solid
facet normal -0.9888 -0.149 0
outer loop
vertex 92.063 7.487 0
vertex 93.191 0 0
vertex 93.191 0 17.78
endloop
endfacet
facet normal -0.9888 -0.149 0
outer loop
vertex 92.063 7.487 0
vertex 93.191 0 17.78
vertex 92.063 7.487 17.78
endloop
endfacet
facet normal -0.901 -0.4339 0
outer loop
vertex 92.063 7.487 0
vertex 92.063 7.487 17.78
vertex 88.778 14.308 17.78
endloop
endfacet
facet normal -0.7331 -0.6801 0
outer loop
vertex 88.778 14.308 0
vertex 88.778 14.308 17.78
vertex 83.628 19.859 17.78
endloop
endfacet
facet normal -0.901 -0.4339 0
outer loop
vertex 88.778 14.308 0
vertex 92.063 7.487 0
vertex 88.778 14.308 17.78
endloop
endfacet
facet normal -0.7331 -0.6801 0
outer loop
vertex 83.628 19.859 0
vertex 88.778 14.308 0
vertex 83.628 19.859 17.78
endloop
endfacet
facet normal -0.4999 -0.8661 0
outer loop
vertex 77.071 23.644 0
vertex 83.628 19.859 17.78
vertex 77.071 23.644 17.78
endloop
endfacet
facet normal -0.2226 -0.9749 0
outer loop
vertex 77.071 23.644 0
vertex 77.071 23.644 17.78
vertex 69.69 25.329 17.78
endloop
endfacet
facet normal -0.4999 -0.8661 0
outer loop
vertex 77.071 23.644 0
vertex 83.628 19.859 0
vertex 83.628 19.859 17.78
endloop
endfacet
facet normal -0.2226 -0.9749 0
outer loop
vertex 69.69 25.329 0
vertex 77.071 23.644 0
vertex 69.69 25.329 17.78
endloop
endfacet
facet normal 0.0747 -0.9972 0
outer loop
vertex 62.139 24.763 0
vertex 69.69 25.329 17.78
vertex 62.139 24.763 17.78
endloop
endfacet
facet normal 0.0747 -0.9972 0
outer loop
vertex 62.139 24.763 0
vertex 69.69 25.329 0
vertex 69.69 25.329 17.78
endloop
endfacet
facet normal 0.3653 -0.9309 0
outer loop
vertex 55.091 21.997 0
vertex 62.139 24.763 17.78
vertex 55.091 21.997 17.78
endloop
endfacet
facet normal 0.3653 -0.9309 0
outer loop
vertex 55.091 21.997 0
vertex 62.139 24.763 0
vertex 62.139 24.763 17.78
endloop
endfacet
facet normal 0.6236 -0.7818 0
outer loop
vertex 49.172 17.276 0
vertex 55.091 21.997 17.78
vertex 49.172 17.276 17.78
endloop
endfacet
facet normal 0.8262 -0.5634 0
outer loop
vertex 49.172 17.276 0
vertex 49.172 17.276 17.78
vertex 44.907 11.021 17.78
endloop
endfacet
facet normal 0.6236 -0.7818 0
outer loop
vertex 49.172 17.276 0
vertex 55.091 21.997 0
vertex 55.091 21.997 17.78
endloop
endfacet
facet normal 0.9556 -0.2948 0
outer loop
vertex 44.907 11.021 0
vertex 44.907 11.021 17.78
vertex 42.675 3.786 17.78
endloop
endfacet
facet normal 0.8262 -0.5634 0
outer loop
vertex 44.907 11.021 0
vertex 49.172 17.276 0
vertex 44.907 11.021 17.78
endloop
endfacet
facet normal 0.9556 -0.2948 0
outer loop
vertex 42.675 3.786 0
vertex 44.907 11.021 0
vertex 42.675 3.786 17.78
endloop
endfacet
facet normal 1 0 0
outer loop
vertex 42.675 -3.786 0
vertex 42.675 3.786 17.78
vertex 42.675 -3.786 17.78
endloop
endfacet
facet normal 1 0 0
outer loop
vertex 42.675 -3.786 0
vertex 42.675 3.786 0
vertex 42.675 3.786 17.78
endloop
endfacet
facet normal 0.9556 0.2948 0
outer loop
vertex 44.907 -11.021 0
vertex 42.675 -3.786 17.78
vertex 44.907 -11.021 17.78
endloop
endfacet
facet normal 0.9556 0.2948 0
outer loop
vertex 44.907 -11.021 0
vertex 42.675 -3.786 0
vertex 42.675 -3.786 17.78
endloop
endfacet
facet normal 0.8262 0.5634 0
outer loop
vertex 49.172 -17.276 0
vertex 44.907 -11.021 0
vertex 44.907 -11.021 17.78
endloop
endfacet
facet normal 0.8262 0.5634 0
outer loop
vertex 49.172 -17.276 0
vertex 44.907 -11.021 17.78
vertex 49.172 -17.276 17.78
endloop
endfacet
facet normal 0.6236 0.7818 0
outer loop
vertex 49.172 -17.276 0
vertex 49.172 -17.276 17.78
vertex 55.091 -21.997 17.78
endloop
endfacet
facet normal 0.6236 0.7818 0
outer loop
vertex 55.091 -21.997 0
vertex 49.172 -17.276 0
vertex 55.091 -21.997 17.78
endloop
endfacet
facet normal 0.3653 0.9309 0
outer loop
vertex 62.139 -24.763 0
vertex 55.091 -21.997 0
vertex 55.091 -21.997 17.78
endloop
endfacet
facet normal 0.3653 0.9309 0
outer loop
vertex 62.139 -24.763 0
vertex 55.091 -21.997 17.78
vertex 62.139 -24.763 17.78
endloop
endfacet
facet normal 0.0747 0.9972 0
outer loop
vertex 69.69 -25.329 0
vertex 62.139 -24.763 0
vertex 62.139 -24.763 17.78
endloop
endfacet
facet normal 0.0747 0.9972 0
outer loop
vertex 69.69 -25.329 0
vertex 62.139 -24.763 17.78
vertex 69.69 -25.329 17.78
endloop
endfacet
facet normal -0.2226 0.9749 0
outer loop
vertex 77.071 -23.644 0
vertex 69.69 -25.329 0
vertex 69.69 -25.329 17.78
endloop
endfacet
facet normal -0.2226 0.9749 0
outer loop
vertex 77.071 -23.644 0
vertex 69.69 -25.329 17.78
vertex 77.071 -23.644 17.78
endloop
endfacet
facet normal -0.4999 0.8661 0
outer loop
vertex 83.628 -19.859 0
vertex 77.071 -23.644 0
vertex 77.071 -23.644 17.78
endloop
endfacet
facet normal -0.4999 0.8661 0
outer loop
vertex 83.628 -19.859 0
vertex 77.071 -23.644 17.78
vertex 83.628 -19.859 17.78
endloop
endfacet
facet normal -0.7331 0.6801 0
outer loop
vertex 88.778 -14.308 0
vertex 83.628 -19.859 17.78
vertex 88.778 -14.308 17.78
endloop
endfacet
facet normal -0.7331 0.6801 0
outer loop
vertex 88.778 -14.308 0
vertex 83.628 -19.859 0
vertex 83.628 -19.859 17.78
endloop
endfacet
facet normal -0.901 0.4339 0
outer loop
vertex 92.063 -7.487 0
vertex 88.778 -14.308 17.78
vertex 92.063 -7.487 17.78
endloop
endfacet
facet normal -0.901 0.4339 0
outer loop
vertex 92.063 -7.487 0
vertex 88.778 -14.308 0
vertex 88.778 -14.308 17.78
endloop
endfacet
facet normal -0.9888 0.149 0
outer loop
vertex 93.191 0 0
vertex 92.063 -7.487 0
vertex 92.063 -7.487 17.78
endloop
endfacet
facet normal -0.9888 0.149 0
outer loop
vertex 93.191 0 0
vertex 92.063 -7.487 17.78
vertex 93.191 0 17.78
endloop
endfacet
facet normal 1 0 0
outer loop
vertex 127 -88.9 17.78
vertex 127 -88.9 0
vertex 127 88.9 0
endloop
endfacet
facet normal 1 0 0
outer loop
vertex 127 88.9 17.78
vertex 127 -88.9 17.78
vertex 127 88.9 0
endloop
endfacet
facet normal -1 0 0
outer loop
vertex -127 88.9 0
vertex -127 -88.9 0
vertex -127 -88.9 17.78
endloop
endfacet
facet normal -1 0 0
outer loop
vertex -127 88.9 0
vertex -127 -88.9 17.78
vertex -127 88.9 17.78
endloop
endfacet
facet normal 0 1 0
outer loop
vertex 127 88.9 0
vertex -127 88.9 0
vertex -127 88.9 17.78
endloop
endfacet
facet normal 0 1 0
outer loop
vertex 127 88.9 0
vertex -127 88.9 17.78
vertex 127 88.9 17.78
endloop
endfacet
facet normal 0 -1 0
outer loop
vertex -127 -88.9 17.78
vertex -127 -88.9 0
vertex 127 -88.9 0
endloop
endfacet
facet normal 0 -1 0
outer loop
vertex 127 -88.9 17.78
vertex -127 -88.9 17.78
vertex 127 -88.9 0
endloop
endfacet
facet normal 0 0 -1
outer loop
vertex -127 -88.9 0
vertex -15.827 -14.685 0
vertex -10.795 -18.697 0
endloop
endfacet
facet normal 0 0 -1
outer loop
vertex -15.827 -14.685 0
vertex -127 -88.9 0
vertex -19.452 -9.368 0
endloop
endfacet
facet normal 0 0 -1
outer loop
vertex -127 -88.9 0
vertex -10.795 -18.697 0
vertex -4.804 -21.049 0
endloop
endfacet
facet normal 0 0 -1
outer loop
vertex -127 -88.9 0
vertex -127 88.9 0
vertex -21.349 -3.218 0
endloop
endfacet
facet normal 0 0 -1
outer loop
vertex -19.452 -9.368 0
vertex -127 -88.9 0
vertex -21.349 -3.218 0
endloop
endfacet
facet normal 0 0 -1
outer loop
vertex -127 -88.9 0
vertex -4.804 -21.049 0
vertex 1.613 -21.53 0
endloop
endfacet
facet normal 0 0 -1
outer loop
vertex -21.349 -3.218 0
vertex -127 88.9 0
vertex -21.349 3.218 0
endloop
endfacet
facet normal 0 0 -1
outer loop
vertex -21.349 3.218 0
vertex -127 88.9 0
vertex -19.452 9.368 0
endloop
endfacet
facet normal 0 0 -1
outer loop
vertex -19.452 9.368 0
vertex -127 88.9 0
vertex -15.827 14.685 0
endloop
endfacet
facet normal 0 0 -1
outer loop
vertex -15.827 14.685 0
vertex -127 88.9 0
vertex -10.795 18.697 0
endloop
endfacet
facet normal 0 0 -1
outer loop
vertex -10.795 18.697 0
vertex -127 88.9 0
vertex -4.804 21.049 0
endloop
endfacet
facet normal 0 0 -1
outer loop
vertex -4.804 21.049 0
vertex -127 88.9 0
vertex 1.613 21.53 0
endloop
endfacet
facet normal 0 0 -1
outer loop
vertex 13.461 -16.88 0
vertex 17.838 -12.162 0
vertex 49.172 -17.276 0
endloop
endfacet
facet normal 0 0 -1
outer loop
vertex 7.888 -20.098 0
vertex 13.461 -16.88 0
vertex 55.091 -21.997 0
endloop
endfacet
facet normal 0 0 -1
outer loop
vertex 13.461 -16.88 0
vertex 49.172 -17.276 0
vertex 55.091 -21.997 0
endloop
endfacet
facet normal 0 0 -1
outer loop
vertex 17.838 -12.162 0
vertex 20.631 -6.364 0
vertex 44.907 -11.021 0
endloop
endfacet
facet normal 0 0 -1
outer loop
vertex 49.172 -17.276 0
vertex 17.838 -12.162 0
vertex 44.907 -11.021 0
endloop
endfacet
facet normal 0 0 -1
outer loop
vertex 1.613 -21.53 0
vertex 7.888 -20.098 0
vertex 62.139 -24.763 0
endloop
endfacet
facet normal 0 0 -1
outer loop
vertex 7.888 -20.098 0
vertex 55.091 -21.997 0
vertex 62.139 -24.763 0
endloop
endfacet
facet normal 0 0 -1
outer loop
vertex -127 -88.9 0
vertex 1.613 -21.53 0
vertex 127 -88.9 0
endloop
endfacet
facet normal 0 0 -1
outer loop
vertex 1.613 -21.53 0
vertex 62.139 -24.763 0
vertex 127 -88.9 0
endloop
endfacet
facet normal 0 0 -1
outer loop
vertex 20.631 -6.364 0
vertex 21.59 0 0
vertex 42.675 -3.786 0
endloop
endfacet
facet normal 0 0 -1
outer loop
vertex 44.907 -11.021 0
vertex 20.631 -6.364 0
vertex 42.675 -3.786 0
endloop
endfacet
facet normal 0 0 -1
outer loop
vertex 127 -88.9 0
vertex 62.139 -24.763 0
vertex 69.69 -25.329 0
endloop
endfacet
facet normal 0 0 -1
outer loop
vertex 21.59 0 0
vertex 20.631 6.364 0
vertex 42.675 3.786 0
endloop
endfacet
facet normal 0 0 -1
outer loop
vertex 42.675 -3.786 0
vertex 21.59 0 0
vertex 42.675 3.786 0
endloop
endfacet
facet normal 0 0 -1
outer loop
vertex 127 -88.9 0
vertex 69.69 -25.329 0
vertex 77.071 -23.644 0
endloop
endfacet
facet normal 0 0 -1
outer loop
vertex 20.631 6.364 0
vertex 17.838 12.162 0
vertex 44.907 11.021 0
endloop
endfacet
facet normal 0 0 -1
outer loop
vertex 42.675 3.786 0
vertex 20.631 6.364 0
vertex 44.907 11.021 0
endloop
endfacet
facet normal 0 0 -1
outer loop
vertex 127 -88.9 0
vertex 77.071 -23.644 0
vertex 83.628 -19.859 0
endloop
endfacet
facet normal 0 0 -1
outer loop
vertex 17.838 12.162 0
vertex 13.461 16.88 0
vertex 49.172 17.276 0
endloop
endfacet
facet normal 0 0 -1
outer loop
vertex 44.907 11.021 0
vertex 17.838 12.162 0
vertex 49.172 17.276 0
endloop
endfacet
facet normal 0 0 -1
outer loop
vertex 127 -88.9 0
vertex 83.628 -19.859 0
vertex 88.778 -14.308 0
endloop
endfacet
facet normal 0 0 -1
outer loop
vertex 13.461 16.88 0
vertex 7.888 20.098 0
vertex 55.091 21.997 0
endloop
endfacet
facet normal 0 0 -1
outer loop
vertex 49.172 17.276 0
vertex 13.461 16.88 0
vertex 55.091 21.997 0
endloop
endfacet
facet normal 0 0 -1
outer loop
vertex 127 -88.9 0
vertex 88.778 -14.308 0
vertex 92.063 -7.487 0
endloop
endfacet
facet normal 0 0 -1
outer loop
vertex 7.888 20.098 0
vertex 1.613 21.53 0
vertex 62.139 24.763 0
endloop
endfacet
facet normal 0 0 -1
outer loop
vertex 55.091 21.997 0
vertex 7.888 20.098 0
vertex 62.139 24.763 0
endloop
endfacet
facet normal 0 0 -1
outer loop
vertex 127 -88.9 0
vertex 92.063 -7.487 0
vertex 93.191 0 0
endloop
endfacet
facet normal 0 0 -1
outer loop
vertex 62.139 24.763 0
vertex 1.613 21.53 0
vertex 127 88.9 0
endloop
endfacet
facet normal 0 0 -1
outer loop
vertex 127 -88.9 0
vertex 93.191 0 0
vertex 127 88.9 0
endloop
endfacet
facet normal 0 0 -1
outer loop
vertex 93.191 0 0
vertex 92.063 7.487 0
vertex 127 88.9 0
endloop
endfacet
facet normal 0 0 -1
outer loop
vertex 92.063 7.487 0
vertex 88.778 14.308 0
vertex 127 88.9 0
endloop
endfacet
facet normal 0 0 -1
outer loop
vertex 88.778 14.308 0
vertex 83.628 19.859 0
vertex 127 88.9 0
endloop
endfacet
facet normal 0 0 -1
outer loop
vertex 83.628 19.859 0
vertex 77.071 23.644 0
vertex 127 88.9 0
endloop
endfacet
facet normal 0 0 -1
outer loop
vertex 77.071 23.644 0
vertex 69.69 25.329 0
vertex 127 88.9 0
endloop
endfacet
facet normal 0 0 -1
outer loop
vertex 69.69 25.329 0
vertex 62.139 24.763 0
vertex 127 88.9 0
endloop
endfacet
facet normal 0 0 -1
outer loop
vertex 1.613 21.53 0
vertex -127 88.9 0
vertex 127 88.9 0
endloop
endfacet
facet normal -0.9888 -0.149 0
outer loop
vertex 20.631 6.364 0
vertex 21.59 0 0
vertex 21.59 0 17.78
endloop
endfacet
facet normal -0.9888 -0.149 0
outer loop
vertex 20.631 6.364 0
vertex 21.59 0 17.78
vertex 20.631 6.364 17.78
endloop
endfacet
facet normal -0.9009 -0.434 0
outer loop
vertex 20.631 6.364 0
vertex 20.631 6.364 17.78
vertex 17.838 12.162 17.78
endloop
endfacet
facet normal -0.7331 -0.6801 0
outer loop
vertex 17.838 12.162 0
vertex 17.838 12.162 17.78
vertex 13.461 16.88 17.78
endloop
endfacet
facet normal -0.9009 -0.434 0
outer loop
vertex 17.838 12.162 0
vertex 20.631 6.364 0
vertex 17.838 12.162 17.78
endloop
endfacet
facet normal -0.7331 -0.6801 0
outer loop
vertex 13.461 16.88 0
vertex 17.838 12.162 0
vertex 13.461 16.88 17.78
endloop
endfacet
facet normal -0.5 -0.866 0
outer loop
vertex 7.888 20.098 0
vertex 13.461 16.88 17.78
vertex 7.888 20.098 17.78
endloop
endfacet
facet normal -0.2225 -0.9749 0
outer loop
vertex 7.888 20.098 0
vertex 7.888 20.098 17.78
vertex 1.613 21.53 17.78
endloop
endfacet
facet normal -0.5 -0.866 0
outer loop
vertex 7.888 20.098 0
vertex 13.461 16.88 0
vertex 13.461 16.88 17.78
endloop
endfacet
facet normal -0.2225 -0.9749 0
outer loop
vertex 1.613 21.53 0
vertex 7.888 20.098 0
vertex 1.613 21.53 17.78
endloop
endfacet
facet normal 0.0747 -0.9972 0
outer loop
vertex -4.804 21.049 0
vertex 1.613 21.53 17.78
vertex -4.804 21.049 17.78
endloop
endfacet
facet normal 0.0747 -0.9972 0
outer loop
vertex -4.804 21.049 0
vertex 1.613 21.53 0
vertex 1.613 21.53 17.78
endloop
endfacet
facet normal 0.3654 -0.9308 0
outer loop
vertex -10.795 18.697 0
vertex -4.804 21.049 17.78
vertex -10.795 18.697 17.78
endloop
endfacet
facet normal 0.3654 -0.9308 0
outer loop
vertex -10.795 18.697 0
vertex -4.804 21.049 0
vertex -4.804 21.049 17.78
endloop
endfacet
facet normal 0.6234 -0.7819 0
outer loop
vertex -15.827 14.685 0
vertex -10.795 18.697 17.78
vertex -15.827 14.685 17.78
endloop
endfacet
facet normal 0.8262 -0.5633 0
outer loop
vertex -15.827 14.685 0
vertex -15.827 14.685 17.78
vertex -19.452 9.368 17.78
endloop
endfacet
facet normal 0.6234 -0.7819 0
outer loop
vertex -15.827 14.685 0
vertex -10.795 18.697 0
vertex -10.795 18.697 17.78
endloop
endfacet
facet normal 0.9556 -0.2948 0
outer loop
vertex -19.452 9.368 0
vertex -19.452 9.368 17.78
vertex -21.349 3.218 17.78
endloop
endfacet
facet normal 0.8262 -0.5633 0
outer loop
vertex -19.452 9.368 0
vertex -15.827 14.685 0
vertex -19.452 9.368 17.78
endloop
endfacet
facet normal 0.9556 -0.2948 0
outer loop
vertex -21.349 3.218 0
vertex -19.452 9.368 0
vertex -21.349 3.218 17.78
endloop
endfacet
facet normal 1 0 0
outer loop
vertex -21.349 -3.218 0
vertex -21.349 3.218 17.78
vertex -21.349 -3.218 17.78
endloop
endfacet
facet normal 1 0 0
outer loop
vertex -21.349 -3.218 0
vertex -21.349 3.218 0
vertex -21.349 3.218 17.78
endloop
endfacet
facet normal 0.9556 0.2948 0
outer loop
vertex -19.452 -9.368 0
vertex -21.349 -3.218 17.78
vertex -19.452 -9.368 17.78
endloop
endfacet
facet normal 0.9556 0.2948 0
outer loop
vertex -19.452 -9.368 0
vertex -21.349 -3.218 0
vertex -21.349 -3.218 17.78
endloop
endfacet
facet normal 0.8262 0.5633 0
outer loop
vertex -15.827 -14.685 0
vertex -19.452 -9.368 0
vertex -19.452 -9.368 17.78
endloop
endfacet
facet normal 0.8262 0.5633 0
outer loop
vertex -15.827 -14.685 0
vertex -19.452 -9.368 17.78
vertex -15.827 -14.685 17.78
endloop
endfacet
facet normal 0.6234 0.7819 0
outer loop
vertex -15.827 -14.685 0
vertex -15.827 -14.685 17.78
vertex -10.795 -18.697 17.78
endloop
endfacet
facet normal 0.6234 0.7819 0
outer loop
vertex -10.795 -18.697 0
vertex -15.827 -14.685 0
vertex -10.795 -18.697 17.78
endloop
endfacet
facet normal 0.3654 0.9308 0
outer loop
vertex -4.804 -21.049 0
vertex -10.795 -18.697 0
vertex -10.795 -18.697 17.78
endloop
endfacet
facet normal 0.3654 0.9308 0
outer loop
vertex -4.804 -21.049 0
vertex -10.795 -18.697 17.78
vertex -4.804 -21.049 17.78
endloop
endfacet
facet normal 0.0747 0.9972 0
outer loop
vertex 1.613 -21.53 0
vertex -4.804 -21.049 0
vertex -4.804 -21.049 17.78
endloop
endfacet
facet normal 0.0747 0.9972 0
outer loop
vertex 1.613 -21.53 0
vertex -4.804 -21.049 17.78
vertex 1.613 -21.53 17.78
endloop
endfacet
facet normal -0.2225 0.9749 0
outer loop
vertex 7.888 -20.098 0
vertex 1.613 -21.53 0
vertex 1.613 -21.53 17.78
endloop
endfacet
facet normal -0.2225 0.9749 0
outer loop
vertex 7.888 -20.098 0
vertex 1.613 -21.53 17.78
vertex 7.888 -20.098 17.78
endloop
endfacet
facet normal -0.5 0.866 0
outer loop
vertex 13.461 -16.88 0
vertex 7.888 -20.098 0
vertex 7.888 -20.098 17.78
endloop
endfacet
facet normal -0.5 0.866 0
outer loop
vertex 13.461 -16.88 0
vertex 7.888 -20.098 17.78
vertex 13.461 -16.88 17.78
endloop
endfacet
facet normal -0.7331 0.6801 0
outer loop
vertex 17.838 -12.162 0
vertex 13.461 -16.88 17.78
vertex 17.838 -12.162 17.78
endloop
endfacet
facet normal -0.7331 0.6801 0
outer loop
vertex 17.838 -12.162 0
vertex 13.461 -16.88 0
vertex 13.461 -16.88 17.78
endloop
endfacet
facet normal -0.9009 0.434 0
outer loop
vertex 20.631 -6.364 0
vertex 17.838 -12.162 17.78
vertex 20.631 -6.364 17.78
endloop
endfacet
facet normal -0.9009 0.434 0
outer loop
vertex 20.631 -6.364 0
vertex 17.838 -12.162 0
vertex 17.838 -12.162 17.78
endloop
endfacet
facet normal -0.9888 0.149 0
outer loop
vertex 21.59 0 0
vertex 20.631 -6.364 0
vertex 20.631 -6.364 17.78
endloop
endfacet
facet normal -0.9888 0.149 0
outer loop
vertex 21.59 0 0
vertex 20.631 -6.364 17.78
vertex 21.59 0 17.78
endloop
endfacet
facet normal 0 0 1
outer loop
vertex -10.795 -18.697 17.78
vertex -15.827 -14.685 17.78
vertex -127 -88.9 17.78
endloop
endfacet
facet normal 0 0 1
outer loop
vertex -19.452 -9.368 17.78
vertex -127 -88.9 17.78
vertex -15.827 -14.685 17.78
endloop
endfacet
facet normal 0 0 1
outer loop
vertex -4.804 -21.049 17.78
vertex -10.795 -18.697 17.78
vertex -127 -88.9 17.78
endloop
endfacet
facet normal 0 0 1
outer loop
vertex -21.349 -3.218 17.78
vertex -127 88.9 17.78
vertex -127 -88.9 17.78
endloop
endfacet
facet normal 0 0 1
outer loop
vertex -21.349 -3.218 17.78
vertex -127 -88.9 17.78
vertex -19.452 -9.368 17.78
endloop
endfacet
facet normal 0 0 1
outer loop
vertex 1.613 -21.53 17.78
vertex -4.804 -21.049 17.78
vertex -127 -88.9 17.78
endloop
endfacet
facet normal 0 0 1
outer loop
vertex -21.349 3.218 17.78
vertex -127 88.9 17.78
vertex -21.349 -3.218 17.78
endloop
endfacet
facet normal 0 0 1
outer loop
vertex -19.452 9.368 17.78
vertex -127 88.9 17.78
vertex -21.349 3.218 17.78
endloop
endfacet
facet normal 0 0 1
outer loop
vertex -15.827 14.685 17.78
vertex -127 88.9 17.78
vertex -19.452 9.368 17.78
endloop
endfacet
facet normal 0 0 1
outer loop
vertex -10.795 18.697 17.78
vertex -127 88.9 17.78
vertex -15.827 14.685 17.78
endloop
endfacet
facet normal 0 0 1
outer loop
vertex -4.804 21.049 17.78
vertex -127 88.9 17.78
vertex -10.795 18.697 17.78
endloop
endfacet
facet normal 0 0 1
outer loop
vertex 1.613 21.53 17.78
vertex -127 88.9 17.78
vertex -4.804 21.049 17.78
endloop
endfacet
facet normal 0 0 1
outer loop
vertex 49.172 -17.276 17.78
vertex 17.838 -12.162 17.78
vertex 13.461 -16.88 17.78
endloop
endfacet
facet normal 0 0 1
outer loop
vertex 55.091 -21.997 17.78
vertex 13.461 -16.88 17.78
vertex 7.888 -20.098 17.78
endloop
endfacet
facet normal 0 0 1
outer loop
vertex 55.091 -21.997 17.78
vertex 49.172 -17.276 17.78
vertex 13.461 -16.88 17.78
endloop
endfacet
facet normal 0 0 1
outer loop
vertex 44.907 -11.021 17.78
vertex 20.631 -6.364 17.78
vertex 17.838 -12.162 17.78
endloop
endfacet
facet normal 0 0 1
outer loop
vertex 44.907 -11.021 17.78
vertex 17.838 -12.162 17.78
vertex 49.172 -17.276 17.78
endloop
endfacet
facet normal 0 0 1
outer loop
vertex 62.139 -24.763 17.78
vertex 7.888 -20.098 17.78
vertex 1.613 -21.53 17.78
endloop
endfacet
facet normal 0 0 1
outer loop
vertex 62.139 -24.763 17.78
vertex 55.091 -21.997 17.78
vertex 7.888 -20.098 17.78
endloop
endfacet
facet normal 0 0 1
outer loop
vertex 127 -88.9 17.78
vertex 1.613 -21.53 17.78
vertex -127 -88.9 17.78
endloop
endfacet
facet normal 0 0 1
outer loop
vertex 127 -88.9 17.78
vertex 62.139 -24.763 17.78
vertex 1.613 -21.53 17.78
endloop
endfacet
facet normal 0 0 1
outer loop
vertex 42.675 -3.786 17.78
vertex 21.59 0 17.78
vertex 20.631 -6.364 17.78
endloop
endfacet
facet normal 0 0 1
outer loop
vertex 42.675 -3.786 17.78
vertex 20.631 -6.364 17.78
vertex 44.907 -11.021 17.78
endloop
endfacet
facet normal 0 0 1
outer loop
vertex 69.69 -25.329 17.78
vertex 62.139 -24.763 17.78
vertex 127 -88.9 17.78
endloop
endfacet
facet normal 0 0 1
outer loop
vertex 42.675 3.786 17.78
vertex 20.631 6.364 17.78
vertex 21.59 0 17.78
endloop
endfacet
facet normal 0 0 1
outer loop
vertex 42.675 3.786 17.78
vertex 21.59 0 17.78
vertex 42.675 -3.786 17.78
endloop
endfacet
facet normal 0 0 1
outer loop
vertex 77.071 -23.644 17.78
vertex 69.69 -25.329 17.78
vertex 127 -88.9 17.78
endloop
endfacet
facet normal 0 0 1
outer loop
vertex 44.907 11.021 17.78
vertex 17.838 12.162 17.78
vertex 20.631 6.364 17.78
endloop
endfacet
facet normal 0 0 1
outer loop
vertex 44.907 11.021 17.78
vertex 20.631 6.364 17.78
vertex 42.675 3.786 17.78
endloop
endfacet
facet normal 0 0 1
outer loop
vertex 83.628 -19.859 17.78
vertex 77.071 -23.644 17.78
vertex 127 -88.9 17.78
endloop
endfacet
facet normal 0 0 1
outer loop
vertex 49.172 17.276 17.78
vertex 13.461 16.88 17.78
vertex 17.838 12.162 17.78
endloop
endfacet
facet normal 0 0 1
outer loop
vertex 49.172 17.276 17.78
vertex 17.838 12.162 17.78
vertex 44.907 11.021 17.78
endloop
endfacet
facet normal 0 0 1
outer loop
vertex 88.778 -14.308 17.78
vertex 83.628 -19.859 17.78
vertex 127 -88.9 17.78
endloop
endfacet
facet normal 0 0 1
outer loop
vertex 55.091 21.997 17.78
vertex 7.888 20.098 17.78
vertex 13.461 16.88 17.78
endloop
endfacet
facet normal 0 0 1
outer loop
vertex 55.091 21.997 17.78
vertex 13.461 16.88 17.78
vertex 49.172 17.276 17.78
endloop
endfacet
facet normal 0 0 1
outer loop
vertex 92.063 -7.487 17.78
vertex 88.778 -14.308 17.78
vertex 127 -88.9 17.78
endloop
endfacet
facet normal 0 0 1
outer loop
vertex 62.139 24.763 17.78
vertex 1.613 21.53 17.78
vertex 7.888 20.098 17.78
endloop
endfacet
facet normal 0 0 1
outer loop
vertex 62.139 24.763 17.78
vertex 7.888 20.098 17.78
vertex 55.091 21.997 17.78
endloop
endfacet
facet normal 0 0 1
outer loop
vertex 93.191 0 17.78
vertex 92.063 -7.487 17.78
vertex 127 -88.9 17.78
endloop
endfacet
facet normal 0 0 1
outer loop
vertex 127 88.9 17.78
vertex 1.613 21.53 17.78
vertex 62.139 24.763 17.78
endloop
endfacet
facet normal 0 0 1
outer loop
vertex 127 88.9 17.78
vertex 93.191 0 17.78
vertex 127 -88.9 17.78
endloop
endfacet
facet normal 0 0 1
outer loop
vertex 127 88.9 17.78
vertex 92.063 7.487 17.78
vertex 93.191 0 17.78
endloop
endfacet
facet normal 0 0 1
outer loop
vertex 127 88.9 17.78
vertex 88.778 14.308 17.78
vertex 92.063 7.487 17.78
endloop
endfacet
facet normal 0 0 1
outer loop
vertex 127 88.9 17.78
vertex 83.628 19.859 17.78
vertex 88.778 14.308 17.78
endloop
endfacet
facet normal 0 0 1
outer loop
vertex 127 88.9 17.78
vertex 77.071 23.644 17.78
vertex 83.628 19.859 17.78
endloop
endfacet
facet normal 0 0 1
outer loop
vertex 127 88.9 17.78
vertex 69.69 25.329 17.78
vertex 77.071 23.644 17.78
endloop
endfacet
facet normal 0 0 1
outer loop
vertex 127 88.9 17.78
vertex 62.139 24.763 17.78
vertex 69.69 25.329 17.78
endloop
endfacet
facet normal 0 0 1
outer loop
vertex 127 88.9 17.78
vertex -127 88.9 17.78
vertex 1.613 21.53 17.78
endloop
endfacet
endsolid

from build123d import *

# Parameters (mm, degrees)
F0_W     = 254
F0_H     = 177.8
F0_R     = 21.59
F0_R_2   = 25.4
F1_DEPTH = 17.78


with BuildPart() as f1:
    # F0 (on Top) → F1 (new body)
    with BuildSketch(Plane.XY):
        Rectangle(F0_W, F0_H)
        Circle(F0_R, mode=Mode.SUBTRACT)
        with Locations((67.79138, 0)):
            Circle(F0_R_2, mode=Mode.SUBTRACT)
    extrude(amount=F1_DEPTH)


solid = f1.part
